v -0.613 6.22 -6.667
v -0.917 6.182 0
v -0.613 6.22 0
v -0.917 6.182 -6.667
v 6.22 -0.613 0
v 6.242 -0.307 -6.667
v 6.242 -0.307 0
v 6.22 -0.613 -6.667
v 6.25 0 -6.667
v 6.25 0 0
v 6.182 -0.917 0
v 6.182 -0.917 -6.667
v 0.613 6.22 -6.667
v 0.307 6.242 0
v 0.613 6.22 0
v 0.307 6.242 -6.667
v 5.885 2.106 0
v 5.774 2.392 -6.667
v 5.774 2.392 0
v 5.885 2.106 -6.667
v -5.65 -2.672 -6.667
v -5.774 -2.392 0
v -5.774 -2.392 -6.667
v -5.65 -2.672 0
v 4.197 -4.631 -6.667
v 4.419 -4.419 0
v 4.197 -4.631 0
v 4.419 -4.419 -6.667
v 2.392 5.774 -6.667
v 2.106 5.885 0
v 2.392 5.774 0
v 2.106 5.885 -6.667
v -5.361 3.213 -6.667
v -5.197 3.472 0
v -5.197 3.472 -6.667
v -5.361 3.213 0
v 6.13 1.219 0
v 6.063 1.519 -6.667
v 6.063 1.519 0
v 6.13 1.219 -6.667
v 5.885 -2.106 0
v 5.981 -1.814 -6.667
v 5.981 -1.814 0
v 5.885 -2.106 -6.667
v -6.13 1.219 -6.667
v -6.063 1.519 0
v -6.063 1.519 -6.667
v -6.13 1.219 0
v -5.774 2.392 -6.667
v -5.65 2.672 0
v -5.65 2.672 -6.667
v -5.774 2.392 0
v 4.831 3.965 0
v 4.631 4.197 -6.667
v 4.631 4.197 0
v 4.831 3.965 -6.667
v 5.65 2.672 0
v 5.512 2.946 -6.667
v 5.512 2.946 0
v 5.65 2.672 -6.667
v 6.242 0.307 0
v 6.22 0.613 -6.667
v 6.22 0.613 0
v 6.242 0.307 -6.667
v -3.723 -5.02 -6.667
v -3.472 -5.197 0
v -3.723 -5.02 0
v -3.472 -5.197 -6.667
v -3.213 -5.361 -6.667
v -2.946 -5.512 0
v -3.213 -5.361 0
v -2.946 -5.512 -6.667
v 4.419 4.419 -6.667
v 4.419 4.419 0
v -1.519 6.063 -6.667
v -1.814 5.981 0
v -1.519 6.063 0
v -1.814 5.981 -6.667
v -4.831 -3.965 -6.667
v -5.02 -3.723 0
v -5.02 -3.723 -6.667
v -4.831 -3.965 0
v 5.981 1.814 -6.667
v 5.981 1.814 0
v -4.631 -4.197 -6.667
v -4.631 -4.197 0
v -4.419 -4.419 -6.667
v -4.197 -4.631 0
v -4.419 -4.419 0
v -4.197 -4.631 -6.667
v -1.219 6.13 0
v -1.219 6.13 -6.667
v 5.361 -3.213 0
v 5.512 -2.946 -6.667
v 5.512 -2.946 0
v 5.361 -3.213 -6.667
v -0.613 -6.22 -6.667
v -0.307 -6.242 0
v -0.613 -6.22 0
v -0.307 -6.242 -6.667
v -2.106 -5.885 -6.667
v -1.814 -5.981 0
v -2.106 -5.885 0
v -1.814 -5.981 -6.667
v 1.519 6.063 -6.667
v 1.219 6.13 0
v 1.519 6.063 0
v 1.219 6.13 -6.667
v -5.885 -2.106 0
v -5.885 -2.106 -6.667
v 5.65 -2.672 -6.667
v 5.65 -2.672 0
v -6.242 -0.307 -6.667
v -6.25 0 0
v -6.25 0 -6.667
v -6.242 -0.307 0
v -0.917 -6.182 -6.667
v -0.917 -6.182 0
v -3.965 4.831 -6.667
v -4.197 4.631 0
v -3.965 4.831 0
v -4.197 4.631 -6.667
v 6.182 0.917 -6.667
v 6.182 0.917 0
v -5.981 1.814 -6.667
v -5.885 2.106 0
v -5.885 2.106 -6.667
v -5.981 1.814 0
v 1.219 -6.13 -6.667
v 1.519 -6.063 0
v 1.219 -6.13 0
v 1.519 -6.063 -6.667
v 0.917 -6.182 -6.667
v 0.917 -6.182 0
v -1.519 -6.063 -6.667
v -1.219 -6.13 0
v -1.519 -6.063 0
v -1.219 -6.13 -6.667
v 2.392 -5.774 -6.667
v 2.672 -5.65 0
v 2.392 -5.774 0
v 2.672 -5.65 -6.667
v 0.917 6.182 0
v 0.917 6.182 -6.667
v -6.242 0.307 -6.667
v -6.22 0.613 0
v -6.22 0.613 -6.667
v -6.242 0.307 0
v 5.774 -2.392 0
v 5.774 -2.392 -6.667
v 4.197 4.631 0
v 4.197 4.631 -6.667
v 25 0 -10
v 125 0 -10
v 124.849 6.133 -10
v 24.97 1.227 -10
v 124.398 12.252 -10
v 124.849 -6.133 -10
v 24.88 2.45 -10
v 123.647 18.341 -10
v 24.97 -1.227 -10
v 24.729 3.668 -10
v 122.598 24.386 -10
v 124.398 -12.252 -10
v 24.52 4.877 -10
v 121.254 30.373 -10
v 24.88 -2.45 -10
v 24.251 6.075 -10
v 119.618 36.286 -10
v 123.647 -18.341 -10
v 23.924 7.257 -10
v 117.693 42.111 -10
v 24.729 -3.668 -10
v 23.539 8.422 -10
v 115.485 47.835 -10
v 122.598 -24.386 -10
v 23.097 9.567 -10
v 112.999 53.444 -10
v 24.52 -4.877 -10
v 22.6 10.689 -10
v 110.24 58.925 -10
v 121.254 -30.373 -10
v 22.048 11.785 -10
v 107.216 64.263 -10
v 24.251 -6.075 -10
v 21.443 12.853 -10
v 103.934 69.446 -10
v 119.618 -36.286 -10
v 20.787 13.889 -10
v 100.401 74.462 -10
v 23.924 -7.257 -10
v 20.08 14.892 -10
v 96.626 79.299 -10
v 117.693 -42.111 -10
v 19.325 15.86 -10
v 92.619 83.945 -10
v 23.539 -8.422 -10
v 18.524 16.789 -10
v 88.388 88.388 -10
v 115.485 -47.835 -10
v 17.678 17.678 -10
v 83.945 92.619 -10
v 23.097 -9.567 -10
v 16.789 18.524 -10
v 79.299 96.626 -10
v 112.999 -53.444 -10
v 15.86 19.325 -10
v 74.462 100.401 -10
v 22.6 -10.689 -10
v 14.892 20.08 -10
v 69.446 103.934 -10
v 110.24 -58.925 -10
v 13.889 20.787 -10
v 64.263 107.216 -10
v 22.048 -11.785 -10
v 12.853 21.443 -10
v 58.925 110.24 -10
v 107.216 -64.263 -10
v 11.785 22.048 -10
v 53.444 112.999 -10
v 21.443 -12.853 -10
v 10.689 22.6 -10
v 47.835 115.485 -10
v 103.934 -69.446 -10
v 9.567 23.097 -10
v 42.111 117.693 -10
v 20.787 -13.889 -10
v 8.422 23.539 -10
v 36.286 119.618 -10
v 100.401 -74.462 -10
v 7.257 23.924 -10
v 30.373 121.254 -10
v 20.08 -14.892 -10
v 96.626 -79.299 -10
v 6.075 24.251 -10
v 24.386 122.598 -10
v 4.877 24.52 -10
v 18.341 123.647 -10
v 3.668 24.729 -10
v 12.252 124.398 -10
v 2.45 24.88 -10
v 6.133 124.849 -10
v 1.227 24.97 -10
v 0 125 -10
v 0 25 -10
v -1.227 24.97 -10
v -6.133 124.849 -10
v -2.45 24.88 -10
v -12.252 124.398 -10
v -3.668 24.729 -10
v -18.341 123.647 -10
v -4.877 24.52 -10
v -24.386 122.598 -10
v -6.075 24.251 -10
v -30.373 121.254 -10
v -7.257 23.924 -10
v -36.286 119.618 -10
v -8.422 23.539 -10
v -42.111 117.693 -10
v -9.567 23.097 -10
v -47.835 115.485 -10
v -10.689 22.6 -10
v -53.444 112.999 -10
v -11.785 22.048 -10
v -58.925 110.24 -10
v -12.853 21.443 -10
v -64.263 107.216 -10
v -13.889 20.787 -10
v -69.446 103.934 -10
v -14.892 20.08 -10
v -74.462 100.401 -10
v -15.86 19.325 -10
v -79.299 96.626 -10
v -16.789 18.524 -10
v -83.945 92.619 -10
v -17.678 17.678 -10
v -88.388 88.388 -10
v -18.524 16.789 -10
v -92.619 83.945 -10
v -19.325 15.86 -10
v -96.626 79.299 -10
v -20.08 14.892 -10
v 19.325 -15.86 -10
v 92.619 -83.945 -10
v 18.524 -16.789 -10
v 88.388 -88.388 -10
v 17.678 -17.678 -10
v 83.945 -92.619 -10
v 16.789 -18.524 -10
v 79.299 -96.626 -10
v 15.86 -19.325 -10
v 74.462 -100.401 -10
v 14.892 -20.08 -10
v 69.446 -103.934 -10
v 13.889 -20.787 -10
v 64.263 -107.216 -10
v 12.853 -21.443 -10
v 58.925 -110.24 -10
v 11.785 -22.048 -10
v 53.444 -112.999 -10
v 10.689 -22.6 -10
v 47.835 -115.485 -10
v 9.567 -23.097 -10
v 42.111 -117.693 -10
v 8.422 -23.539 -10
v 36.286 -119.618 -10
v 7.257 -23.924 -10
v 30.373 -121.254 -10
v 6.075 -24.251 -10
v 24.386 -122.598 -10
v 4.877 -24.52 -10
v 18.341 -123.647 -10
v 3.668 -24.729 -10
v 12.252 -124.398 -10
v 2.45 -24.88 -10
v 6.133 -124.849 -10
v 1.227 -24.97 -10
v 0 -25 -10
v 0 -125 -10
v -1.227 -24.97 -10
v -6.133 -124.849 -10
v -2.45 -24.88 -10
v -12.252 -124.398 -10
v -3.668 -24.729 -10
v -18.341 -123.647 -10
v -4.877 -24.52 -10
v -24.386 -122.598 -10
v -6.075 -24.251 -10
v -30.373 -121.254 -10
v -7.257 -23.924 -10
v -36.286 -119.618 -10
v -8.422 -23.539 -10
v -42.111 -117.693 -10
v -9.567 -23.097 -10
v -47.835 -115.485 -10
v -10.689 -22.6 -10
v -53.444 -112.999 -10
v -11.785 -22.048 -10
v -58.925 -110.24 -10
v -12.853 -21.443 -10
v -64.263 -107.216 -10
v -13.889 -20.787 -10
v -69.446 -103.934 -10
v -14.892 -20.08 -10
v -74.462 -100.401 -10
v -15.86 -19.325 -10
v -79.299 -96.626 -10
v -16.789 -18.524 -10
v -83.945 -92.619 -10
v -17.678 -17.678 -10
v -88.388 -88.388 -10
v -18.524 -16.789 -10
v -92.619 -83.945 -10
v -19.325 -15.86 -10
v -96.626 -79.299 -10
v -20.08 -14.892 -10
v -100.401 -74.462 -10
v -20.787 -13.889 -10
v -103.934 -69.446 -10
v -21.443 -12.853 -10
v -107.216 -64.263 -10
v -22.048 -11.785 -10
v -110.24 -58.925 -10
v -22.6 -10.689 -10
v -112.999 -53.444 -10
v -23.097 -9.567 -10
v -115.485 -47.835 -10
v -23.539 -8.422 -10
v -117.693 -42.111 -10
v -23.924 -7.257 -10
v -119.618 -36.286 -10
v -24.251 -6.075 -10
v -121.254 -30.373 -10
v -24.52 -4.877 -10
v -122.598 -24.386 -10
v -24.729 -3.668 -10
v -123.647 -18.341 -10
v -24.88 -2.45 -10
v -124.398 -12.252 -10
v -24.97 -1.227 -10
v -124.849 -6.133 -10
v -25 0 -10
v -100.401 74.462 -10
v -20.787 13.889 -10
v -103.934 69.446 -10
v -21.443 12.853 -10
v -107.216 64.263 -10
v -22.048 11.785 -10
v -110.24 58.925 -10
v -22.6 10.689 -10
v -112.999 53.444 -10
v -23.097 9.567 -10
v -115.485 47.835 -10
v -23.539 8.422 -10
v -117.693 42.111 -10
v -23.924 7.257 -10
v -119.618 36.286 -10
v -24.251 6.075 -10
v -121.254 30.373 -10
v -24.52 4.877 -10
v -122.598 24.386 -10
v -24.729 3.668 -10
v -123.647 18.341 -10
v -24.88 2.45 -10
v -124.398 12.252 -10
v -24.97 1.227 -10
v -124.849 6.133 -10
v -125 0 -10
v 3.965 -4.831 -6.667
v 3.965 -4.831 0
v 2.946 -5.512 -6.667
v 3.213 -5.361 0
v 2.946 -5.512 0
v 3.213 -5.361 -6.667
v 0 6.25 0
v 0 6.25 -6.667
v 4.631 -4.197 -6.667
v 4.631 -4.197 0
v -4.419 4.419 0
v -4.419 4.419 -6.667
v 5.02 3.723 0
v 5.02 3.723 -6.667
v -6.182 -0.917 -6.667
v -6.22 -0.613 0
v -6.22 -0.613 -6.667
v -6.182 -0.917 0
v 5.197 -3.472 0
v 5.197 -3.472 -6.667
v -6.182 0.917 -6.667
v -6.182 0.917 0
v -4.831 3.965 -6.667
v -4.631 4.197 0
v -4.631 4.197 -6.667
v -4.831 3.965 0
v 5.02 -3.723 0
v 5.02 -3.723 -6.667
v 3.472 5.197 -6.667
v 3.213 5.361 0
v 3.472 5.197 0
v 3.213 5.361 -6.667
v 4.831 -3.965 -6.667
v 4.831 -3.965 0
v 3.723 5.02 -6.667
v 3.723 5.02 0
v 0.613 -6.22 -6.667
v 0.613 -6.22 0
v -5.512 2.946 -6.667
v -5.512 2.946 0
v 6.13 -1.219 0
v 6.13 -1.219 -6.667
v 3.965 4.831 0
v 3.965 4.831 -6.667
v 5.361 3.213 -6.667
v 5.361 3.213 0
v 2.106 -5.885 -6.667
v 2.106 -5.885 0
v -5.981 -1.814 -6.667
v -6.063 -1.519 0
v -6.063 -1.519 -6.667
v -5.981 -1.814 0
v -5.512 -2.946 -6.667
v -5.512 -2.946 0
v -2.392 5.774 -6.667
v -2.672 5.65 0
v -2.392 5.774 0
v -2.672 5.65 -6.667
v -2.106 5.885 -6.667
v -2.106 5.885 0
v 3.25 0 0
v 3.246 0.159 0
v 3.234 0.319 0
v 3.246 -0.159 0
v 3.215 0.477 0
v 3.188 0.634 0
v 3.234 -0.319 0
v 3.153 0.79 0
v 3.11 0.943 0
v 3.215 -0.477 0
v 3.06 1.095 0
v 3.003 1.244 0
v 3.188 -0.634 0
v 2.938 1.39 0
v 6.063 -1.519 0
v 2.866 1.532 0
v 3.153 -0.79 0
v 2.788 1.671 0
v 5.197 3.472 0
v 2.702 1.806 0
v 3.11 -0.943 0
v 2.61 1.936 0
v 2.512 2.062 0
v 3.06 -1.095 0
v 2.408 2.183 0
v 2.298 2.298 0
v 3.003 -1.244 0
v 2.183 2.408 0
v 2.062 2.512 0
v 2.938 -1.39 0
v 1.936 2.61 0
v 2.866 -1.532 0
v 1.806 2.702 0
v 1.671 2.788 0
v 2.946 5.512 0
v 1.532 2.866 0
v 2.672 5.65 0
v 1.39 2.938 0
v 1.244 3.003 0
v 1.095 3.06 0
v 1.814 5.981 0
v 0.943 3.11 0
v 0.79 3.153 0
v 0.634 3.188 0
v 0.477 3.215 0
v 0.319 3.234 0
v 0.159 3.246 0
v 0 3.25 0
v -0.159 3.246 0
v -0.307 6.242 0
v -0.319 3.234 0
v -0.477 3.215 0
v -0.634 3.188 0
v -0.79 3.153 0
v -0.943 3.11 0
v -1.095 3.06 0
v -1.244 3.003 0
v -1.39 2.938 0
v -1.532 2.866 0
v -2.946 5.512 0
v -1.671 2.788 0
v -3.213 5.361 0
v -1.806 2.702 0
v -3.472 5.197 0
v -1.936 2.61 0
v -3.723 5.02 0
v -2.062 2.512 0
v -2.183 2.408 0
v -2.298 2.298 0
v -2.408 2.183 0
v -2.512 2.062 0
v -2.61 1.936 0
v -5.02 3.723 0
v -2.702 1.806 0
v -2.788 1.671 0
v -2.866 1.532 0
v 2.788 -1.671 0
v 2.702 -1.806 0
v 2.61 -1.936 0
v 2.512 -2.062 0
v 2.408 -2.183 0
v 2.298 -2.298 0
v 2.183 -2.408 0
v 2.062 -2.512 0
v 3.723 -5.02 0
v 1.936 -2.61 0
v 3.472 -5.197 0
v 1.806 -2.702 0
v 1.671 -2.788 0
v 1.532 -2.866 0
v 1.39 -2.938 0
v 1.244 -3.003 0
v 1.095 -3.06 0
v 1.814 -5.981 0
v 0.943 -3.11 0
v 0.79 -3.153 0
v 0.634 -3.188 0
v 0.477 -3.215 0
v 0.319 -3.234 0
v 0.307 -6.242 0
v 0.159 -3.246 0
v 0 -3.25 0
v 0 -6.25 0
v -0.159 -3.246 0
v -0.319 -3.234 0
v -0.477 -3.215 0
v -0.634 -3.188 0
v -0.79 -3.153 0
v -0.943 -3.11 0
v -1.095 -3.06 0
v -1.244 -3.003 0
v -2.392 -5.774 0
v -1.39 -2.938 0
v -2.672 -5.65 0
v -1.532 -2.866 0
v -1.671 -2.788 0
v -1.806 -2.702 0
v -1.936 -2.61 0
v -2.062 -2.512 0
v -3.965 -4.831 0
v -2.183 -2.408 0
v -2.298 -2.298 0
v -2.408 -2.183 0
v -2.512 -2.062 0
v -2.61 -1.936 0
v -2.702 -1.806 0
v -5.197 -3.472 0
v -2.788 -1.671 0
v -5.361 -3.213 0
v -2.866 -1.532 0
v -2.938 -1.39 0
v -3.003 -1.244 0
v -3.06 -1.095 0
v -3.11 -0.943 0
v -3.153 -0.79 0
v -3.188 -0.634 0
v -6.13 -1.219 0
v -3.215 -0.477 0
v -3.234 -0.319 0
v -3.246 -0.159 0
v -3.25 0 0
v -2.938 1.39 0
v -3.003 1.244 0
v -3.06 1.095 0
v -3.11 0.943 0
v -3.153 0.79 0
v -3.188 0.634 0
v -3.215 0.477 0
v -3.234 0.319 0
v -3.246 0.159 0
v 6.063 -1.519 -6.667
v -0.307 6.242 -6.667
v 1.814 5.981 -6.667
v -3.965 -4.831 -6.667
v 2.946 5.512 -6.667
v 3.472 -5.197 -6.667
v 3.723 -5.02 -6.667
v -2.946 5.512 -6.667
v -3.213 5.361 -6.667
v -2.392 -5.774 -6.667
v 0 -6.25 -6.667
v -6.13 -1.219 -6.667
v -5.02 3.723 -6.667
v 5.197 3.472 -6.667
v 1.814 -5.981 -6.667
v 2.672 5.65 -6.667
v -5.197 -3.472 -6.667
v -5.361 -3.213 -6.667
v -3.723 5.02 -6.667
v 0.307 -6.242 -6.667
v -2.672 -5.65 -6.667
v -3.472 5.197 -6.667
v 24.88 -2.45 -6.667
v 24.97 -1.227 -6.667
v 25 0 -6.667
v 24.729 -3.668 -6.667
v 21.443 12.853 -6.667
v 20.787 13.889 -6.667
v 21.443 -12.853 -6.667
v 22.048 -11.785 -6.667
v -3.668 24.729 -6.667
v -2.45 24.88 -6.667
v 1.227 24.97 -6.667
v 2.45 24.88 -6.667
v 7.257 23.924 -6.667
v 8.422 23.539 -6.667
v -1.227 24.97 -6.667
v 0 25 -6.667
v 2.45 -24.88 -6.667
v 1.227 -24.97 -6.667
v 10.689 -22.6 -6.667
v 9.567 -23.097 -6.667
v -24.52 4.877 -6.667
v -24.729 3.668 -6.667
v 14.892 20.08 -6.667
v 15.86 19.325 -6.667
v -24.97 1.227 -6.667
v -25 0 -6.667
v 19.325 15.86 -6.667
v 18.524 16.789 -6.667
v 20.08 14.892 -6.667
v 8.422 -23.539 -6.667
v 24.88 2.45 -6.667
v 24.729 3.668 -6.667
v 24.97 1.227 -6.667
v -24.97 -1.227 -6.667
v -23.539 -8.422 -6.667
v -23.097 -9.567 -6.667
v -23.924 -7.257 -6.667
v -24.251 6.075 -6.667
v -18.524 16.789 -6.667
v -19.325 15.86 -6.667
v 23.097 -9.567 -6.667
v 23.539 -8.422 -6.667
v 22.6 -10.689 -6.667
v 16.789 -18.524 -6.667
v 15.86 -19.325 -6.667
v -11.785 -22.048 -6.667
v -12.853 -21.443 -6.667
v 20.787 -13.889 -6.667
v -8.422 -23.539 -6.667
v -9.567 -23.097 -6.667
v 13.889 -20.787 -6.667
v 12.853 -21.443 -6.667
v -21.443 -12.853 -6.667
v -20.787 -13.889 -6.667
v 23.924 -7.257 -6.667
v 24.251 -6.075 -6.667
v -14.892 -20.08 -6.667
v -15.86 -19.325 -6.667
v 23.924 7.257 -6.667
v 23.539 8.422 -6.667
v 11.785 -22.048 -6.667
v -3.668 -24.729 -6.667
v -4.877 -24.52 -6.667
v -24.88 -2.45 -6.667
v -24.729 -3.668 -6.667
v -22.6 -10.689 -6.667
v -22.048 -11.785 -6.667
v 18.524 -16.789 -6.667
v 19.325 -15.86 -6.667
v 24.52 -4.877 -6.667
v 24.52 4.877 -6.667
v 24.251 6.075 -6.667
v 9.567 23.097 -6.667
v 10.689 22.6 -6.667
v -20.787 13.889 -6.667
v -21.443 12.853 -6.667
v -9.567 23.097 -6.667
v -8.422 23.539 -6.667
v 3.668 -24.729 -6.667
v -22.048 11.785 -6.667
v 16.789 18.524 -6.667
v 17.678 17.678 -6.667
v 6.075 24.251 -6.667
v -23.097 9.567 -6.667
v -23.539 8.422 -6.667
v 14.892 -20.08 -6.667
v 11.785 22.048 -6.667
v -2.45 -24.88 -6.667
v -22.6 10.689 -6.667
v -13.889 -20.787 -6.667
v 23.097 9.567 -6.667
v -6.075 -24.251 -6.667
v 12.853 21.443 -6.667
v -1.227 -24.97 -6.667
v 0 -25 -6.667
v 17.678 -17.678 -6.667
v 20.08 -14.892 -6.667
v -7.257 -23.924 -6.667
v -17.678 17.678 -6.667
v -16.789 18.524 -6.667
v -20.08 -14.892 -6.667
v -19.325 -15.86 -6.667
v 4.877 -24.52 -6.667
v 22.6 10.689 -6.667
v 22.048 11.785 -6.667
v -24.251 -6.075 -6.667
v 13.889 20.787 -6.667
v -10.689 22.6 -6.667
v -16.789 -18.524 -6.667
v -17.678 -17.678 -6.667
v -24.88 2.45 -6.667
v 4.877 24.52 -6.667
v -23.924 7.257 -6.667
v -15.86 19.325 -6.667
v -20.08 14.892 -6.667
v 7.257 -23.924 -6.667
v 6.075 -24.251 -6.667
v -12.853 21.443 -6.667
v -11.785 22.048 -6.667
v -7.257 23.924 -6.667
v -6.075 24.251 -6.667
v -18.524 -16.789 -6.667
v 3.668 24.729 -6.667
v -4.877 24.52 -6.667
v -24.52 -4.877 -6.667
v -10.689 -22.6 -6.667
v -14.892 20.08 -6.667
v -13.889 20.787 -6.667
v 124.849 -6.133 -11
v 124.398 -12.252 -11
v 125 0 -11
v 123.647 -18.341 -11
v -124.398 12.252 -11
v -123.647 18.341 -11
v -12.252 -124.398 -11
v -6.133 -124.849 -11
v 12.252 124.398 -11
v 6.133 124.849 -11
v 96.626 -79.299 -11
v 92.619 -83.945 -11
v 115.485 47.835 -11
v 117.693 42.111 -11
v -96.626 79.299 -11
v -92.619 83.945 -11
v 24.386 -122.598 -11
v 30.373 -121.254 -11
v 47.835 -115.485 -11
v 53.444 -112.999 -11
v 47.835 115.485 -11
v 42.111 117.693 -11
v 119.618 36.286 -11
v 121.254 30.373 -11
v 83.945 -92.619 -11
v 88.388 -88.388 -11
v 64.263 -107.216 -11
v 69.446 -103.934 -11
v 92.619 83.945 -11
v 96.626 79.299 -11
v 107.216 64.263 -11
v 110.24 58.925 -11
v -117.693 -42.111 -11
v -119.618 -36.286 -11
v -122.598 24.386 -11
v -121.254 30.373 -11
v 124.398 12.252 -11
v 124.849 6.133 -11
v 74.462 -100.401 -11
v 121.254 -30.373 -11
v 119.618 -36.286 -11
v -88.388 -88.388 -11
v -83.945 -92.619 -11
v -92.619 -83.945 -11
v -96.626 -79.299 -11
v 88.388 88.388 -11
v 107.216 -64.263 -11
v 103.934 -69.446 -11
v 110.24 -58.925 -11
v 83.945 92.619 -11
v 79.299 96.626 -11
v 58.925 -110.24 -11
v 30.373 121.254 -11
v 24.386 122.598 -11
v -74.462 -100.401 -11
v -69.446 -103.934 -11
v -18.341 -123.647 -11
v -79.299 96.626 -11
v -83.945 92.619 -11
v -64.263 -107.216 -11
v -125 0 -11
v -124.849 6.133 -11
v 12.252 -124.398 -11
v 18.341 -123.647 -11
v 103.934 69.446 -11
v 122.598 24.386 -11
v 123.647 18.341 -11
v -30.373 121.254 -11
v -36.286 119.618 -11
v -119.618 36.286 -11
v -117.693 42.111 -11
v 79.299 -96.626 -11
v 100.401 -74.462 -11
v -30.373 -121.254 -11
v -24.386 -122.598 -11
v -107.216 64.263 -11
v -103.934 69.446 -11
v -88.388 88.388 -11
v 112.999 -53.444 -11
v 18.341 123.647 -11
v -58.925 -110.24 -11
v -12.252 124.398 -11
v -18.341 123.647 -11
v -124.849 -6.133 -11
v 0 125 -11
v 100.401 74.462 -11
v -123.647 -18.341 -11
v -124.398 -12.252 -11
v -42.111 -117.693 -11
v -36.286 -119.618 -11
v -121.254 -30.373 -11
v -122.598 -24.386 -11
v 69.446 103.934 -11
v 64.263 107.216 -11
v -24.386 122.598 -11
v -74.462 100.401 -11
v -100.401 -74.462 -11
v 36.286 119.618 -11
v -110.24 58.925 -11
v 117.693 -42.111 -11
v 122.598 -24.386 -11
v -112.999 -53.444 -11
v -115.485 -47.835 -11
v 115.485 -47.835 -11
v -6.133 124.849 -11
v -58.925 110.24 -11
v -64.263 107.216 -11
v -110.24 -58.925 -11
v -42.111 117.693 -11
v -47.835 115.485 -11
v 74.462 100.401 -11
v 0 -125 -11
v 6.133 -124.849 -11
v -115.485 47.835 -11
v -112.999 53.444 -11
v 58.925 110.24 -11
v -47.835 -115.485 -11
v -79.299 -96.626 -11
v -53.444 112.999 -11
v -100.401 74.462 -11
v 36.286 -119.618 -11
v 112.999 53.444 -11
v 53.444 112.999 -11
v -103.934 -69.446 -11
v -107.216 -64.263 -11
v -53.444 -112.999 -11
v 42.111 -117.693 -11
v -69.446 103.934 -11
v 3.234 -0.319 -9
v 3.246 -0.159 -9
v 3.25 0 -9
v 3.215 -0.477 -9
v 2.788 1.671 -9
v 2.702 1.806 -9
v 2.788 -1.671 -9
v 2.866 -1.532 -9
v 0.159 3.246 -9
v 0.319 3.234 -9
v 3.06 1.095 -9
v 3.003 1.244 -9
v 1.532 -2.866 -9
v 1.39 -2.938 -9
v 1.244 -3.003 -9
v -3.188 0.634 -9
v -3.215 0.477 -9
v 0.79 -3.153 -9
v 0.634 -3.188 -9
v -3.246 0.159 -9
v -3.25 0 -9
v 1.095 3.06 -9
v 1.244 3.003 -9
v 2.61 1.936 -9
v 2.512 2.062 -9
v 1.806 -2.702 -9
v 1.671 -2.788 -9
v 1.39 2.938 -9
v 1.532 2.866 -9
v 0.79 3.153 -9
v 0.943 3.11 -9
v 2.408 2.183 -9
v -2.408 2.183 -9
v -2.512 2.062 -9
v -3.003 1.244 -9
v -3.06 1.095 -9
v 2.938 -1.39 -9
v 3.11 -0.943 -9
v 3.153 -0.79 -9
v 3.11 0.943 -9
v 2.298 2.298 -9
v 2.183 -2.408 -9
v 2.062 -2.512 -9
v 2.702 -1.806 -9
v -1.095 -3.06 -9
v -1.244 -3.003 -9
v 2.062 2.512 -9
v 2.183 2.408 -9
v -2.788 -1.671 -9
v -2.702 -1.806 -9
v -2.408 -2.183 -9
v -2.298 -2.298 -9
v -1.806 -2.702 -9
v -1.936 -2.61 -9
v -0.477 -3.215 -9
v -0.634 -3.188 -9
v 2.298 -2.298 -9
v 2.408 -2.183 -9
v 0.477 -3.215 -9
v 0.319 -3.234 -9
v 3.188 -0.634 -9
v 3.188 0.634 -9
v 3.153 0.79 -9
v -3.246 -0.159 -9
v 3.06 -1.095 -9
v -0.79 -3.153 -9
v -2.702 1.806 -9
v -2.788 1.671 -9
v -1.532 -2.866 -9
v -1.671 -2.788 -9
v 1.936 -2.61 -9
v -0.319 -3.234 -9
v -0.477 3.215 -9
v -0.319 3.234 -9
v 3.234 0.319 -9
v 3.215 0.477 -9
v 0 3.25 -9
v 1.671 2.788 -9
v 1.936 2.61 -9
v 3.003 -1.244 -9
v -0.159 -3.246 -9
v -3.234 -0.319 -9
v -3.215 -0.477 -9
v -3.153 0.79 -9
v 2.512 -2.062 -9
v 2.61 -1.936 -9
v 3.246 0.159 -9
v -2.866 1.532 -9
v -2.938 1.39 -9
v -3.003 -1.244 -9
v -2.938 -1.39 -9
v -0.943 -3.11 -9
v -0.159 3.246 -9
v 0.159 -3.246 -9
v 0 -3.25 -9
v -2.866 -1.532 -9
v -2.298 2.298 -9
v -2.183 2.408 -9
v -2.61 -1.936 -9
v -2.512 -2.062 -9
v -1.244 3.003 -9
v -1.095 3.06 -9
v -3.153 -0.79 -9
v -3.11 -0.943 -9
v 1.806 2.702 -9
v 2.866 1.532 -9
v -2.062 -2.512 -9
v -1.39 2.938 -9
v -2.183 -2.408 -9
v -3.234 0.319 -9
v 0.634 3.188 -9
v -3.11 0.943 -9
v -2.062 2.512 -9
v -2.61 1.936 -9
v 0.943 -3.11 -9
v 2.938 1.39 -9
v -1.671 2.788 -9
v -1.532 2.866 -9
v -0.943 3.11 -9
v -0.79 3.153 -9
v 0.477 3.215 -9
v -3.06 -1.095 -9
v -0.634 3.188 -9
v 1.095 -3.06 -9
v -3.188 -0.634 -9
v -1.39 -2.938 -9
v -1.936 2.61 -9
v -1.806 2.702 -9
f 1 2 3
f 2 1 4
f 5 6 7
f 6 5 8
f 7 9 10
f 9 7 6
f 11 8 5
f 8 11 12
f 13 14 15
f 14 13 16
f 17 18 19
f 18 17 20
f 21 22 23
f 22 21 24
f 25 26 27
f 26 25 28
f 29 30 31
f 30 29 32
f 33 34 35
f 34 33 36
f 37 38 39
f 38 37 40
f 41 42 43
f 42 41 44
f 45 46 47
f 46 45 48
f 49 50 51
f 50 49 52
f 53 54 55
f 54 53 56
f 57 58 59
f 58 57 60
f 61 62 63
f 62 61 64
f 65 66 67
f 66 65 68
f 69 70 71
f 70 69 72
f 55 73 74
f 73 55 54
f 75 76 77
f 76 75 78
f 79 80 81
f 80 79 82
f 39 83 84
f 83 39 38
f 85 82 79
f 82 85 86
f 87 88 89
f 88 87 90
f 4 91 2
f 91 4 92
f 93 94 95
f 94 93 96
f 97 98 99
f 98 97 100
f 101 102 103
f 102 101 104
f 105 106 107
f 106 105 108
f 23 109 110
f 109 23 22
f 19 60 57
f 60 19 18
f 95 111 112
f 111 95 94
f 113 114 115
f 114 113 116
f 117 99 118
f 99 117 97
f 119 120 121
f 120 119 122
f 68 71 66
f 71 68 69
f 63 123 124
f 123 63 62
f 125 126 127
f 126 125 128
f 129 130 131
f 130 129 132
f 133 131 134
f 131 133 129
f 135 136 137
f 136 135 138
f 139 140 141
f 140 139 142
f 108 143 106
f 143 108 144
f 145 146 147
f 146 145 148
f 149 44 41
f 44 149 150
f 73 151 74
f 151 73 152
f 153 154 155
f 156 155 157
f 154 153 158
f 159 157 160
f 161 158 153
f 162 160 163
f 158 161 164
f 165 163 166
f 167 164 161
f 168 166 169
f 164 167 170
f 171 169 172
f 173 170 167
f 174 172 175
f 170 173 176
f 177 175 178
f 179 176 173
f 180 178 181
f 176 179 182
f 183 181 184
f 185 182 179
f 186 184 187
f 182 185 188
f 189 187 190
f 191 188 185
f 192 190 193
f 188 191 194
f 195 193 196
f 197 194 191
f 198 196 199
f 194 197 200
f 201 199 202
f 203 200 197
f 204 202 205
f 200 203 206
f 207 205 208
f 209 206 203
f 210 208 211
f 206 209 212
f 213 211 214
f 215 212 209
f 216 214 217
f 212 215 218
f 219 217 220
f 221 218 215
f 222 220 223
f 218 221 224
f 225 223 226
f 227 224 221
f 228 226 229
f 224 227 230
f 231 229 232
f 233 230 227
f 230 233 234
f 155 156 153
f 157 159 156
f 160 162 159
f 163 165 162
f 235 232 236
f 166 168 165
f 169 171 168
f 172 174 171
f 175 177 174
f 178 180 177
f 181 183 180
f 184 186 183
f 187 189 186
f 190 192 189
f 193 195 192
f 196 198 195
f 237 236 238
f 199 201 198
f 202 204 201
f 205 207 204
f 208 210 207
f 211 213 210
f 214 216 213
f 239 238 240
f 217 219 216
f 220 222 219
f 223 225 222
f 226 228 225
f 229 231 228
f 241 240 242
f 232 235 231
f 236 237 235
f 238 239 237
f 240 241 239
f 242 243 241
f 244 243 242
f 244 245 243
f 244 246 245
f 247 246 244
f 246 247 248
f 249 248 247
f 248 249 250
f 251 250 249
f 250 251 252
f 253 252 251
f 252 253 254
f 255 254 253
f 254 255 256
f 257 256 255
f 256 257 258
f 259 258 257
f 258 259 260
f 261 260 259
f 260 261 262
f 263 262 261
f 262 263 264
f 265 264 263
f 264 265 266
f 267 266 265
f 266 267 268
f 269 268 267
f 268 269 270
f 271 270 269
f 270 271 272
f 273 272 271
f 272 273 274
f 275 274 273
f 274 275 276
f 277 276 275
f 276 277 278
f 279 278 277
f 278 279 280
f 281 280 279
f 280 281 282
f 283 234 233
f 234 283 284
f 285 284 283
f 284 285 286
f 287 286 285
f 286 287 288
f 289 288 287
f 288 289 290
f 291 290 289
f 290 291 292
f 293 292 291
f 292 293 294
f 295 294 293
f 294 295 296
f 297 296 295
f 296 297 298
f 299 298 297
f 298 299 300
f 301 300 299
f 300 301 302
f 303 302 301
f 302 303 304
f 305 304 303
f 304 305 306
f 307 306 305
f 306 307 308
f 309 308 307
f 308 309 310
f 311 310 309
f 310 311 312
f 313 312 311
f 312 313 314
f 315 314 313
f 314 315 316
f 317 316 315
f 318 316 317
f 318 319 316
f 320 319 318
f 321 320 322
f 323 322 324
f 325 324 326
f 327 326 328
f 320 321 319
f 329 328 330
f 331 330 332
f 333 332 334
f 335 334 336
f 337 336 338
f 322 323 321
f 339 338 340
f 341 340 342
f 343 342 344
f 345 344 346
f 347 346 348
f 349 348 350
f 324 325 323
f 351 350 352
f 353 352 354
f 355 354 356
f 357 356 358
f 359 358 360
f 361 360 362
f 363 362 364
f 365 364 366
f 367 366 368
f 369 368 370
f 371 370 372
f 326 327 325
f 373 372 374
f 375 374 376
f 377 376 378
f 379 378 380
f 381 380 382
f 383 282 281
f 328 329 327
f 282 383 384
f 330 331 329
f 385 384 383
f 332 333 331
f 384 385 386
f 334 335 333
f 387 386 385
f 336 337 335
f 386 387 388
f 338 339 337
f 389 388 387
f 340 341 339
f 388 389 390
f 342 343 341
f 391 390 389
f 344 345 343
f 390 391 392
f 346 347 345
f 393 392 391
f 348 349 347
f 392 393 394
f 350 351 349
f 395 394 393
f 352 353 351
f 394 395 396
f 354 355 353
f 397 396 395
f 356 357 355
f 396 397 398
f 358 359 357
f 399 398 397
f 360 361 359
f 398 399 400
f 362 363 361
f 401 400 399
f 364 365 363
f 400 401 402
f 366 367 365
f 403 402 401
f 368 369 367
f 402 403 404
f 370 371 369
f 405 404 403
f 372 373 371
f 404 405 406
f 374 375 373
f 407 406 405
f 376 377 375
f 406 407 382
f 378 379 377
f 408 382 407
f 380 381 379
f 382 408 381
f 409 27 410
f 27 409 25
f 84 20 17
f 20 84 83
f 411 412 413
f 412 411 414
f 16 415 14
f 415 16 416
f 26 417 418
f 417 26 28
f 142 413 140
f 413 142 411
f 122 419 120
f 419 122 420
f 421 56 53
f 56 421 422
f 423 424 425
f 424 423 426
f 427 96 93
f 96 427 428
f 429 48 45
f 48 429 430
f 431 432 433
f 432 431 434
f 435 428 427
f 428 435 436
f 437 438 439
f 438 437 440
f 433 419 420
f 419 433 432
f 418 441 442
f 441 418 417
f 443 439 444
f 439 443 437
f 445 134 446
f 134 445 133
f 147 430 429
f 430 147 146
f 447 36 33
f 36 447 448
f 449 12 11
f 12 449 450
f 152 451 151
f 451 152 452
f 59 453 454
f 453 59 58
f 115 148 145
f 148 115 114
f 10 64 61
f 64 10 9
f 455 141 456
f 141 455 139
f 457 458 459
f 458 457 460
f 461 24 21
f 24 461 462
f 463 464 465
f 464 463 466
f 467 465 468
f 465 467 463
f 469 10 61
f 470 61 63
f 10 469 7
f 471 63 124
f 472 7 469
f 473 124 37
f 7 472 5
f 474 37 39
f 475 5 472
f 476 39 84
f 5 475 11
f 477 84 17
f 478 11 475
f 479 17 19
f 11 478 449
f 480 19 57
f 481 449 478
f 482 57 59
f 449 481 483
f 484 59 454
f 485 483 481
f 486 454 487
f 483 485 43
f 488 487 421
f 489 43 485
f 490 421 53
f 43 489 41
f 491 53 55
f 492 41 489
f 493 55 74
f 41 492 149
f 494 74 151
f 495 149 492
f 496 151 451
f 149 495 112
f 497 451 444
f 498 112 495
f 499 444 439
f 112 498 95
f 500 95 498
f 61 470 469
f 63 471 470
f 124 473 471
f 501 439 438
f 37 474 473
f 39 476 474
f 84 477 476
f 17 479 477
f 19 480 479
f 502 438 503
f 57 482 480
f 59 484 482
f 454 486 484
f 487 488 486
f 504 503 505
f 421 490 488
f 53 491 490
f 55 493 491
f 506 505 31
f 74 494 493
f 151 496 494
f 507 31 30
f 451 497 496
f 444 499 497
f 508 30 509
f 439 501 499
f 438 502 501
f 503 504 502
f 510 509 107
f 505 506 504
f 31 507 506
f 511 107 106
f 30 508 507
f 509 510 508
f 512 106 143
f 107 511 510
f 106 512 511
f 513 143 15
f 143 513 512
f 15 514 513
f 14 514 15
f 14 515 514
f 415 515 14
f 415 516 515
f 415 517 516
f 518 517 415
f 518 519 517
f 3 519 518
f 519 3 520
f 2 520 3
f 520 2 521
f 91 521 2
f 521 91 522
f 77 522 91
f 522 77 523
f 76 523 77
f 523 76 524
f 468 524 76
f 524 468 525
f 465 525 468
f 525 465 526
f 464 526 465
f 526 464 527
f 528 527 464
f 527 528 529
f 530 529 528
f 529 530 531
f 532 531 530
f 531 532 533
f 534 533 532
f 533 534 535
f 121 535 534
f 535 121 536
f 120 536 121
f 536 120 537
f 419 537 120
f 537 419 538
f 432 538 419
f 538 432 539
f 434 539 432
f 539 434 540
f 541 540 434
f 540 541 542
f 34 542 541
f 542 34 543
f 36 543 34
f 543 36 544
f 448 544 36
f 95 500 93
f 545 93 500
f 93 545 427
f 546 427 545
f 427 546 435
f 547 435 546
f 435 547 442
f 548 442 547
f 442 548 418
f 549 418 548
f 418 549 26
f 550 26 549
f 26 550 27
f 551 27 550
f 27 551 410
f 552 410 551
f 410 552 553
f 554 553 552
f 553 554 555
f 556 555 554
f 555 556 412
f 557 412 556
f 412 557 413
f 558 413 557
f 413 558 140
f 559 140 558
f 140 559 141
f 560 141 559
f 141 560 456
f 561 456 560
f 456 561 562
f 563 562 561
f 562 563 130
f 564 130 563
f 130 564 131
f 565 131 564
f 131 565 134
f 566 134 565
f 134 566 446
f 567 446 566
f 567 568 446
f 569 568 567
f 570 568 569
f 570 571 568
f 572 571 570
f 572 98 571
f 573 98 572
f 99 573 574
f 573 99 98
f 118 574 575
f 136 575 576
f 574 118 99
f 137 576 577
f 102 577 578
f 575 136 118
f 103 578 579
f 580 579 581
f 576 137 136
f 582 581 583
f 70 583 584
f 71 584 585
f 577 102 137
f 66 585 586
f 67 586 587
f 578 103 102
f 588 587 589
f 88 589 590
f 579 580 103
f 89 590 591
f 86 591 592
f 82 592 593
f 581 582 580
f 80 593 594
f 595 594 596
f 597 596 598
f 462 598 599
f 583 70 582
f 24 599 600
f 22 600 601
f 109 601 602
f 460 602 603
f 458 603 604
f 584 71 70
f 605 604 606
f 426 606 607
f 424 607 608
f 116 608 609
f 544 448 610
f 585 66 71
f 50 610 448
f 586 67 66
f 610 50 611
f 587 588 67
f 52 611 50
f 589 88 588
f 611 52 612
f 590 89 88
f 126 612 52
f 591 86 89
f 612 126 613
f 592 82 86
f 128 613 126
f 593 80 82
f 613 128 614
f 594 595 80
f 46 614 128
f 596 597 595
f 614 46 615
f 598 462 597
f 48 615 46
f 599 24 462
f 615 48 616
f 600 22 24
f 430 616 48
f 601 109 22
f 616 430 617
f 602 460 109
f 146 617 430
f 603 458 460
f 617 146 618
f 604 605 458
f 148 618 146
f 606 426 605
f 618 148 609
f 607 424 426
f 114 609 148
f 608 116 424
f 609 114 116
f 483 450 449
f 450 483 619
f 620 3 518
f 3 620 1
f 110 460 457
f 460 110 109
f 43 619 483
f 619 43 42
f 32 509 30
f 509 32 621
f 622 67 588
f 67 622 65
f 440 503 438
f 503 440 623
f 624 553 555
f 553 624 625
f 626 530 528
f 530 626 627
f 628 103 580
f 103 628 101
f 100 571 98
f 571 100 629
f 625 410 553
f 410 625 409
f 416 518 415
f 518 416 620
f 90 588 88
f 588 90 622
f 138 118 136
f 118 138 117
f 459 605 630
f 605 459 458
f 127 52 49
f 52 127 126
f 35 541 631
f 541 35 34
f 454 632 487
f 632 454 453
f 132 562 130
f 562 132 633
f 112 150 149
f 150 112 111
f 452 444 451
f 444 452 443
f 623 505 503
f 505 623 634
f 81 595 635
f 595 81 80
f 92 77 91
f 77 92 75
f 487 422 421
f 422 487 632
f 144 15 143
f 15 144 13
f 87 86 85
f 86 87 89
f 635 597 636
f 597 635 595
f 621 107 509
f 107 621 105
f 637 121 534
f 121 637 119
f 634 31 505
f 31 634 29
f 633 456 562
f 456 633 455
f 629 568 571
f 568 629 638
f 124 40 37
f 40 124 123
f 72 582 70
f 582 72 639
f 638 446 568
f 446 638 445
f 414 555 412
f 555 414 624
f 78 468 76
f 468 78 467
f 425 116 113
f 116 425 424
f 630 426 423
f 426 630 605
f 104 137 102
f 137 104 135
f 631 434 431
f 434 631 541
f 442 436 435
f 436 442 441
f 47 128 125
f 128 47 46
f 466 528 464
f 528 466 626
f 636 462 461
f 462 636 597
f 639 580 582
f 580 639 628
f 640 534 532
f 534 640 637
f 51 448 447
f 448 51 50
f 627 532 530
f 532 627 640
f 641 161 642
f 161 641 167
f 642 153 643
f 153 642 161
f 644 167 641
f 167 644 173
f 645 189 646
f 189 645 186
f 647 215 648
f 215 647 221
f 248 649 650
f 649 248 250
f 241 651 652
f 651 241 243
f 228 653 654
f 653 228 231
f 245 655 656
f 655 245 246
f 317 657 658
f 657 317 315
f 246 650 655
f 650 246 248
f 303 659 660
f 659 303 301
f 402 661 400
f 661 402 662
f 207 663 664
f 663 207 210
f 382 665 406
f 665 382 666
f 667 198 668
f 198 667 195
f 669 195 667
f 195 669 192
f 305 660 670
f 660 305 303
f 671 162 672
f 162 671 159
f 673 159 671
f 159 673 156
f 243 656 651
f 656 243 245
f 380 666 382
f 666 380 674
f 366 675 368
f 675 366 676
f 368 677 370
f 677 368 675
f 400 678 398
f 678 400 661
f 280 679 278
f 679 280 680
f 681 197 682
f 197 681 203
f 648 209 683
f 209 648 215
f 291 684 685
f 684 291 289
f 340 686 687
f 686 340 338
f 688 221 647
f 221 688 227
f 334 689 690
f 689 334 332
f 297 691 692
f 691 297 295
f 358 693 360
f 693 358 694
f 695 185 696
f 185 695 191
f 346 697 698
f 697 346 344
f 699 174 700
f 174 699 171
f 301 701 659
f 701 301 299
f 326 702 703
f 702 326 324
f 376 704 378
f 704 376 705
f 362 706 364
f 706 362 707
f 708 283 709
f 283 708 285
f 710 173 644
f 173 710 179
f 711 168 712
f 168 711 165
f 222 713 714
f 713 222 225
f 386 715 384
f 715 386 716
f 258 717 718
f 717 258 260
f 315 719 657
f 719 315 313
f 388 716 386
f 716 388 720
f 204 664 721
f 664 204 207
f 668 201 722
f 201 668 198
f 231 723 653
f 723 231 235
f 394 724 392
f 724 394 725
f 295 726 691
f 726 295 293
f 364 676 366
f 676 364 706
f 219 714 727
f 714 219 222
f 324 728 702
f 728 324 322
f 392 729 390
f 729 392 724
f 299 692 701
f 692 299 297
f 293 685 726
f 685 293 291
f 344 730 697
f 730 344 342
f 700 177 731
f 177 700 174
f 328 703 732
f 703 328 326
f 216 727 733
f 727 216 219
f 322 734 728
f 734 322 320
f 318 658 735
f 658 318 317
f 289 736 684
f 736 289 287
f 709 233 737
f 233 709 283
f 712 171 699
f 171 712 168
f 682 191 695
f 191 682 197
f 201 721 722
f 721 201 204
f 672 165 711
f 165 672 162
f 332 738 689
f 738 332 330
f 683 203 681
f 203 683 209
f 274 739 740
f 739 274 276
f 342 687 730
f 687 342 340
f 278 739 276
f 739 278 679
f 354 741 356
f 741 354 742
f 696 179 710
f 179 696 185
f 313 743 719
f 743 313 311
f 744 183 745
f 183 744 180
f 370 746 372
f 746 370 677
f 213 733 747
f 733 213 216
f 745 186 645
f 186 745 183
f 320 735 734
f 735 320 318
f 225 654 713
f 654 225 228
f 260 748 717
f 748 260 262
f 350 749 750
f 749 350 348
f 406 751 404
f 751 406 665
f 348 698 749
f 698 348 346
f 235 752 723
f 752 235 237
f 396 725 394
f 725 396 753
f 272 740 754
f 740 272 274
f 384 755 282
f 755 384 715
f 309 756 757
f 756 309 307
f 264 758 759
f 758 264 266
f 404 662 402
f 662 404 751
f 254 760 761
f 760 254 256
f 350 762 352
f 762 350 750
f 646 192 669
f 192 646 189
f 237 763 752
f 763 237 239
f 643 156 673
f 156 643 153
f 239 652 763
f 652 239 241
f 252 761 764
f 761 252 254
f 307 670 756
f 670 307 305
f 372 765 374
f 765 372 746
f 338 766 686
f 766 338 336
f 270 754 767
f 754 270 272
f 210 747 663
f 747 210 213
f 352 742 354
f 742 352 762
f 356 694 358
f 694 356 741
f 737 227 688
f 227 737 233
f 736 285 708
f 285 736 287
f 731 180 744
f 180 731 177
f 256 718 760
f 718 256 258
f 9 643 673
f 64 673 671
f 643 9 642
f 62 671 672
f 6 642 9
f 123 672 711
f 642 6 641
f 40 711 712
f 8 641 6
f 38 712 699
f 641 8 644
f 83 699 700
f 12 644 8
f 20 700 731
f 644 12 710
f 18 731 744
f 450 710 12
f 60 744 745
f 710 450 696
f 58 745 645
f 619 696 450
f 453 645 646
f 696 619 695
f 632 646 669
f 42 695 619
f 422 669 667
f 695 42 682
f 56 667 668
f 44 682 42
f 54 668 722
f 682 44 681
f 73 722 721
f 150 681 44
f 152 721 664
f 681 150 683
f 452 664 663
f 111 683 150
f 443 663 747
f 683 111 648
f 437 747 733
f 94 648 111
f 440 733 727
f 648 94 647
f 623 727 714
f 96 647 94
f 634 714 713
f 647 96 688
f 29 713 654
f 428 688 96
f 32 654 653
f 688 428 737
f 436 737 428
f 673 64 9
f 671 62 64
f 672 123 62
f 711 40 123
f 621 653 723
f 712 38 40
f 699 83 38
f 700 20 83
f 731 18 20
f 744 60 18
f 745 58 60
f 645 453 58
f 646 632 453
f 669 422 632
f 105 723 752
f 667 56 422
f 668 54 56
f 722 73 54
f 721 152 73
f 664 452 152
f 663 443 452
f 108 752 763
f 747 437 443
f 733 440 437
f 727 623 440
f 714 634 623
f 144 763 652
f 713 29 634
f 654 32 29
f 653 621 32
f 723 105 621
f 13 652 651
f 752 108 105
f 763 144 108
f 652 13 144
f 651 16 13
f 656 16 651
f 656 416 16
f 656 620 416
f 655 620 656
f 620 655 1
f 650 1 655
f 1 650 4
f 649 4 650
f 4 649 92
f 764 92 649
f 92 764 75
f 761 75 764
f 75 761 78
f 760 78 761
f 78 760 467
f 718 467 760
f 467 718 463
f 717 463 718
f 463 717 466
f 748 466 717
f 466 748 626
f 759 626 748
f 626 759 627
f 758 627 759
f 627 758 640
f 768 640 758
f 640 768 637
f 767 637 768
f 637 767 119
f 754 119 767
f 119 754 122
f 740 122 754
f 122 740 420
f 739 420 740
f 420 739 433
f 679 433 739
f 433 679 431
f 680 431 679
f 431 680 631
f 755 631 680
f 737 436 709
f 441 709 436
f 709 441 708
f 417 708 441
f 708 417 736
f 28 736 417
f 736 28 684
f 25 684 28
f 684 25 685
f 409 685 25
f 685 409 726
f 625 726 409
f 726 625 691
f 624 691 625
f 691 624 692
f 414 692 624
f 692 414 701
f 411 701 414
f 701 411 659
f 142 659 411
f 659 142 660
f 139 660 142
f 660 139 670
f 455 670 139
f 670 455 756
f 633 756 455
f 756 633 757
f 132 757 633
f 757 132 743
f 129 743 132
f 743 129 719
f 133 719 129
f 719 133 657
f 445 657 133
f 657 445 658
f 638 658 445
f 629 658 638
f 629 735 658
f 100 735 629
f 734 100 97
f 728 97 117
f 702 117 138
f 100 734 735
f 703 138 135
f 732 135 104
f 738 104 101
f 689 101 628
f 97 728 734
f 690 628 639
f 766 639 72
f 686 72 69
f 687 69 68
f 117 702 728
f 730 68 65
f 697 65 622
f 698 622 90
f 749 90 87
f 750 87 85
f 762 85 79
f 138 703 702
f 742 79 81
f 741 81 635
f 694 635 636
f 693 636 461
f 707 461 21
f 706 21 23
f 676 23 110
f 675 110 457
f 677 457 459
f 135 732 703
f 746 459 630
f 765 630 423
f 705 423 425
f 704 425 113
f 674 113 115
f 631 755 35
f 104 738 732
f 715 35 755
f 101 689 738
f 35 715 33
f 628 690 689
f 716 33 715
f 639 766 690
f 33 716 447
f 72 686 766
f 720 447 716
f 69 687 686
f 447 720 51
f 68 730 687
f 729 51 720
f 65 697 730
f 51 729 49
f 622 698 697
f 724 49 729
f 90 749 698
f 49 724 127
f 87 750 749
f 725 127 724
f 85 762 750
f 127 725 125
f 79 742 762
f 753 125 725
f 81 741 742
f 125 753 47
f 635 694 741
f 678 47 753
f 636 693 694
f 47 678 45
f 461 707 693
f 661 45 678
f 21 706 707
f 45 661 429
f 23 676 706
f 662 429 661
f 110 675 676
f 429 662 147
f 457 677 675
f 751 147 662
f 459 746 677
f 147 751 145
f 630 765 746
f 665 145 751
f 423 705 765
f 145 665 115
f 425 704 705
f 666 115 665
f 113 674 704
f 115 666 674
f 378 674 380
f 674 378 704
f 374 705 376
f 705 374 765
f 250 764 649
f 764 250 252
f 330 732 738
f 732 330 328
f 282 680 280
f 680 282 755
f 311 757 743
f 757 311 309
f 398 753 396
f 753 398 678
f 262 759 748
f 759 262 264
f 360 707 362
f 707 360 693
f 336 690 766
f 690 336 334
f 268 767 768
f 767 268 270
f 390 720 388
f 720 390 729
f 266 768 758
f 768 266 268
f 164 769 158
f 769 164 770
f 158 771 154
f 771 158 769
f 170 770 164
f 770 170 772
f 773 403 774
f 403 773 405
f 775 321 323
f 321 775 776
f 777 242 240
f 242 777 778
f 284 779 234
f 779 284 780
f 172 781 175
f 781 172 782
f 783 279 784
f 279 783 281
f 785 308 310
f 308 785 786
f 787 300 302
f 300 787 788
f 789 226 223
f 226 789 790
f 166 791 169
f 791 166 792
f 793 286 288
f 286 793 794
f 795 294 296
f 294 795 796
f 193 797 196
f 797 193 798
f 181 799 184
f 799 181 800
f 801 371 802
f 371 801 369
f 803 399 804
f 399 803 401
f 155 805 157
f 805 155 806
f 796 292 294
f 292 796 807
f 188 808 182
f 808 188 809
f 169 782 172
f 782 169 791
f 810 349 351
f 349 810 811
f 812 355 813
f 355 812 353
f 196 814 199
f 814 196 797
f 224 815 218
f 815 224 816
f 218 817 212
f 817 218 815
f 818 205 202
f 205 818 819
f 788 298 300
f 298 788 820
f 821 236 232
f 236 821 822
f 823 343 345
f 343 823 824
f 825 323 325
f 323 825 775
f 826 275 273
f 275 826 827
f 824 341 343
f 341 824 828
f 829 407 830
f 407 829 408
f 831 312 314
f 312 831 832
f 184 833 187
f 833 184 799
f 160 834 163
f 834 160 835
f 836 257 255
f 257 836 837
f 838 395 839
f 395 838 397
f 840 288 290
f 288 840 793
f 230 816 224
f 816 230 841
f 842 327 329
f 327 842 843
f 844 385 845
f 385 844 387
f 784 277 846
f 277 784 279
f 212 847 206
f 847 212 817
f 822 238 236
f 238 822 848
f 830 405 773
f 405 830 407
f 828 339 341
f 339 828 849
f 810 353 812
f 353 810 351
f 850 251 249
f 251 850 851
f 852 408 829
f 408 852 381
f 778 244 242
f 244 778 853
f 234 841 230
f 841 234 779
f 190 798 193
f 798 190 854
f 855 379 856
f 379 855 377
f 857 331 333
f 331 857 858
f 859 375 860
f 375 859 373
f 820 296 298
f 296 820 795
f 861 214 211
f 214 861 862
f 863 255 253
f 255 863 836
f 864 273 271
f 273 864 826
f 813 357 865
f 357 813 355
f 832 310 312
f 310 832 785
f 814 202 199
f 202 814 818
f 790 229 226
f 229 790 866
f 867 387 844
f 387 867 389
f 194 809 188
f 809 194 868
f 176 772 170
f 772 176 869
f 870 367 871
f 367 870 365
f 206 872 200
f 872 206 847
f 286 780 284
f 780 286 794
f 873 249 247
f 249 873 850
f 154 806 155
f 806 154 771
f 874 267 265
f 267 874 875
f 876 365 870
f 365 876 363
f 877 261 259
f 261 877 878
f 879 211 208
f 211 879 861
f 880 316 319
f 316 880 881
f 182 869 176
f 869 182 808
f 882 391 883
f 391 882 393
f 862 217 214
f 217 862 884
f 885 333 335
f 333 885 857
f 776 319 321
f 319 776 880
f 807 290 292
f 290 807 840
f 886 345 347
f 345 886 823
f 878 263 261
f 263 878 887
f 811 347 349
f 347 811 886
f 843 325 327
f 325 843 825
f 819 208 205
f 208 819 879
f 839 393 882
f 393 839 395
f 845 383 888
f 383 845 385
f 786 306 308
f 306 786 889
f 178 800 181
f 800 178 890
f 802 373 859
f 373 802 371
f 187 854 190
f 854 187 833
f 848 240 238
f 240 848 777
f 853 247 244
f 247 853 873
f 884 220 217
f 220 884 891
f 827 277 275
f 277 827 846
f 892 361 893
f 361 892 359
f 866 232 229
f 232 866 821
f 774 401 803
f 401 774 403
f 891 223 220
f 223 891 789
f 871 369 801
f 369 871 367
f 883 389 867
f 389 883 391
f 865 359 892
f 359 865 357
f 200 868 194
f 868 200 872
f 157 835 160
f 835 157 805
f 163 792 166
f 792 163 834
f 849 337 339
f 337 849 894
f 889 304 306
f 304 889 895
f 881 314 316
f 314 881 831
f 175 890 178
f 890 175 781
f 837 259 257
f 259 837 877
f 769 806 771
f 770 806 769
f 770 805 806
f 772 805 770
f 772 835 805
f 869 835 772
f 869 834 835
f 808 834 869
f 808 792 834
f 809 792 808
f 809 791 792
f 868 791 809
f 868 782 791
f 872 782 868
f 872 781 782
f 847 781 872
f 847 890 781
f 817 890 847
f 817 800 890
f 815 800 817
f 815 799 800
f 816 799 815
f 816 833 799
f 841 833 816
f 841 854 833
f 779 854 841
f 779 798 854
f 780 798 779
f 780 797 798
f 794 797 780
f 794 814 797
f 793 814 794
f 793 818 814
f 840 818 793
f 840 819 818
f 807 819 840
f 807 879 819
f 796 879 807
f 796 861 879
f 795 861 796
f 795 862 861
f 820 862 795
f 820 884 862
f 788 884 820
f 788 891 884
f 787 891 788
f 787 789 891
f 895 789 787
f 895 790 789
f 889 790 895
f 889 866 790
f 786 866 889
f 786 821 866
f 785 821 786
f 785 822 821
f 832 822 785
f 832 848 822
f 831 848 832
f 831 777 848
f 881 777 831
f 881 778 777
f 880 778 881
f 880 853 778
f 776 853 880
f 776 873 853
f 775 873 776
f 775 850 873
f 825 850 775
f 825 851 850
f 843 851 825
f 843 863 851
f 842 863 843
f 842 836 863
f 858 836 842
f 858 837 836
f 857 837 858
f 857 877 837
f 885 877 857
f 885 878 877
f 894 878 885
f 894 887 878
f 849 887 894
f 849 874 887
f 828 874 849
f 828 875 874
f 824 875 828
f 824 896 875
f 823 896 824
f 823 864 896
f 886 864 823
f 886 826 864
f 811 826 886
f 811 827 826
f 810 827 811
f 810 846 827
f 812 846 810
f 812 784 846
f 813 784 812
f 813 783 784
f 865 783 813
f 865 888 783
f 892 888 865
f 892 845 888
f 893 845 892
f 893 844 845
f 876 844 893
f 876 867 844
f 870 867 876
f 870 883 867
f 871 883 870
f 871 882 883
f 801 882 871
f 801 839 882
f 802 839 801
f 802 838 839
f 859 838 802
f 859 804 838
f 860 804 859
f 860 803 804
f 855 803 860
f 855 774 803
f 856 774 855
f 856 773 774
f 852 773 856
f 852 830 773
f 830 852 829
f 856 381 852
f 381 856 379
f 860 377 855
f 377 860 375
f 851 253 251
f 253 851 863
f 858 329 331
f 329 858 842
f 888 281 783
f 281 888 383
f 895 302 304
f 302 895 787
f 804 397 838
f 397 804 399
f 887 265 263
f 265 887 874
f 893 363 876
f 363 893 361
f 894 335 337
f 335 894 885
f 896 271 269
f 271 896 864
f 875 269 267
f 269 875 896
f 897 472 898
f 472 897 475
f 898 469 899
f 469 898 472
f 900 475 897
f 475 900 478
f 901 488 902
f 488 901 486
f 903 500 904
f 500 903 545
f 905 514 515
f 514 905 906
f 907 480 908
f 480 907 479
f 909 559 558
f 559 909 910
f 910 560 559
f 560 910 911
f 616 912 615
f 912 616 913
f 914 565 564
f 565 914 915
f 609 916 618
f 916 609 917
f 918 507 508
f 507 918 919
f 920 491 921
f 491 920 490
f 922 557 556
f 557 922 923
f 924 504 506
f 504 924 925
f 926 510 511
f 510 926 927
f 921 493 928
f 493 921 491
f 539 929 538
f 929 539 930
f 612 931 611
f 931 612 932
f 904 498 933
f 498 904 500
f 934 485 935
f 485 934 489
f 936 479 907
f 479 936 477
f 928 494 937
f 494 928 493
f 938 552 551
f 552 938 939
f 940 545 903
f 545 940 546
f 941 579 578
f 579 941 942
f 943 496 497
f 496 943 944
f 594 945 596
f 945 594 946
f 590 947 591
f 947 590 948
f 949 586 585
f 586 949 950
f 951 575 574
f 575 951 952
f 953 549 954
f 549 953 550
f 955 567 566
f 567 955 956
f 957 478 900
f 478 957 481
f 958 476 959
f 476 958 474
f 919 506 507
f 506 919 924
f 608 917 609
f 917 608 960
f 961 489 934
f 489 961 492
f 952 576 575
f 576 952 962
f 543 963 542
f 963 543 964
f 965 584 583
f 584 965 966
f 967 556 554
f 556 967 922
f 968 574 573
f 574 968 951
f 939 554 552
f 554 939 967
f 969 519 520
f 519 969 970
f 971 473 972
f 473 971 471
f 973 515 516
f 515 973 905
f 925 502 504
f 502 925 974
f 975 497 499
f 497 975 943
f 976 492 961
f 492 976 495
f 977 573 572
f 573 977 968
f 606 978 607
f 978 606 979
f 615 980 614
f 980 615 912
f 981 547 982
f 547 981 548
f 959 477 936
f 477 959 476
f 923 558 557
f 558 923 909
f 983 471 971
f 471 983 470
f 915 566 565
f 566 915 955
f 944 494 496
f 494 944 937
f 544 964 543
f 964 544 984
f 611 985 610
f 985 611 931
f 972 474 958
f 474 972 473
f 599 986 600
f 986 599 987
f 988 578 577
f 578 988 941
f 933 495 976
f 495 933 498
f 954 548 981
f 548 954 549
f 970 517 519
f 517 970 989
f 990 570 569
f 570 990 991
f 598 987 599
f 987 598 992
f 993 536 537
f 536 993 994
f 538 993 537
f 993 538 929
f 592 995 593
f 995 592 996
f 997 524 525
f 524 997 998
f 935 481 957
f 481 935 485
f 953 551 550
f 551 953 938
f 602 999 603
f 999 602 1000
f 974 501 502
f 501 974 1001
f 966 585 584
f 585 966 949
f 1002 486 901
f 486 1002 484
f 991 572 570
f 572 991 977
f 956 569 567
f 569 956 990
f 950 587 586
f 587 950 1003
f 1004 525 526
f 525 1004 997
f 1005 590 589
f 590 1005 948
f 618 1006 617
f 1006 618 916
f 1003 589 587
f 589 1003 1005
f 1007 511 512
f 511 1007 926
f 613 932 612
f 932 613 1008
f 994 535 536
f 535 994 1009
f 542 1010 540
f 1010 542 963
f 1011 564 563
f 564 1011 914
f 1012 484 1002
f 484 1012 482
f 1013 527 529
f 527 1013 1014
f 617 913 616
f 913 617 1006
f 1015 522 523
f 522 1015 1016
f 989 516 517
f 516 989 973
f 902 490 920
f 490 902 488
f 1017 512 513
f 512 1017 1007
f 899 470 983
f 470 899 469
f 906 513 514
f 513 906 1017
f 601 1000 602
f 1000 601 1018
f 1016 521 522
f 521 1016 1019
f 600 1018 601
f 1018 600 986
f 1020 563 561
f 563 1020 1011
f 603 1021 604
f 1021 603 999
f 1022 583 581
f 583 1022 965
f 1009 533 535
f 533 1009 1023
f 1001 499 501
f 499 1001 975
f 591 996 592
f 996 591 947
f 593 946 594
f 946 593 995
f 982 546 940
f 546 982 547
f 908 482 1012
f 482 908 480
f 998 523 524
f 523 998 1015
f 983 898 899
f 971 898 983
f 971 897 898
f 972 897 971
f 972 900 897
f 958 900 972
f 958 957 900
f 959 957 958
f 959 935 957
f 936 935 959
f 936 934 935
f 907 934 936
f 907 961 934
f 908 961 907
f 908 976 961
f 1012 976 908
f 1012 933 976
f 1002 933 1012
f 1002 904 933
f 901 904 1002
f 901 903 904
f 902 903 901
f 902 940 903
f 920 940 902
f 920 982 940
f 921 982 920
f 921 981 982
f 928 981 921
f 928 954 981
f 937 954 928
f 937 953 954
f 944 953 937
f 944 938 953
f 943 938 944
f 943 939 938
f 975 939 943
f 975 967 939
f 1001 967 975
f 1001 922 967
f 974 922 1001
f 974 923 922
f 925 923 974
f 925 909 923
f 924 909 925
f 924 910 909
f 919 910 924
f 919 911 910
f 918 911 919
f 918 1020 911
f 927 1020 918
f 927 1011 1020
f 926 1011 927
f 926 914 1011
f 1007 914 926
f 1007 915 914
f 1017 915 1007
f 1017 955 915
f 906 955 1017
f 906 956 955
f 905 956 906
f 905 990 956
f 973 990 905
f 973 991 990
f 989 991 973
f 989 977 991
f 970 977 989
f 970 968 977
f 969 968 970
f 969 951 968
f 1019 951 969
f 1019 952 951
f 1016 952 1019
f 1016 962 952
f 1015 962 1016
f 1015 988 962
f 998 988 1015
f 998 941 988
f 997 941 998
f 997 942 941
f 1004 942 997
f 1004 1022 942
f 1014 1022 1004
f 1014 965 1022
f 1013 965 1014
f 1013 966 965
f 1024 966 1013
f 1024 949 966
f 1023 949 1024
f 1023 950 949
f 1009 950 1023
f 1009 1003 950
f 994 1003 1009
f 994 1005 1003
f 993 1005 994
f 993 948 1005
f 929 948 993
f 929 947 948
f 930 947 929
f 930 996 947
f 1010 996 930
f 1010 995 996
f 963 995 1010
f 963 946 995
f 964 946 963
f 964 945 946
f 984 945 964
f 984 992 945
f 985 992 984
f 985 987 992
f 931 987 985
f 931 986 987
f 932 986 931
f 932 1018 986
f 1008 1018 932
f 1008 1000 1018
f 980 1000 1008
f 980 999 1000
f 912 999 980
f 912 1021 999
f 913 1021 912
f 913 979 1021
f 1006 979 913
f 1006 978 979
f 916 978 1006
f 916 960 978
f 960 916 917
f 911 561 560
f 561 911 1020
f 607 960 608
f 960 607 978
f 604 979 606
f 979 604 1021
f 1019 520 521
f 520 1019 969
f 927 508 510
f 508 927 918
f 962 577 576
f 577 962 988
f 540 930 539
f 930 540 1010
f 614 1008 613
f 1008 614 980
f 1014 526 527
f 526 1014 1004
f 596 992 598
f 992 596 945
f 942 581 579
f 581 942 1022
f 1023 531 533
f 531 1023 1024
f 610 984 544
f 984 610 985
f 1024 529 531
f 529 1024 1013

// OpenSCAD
module render() {
  fn = 128;
  thickness = 1.0; // 1.75;
  expansion_fudge = 0.5;
  shaft_radius = (6 + expansion_fudge) / 2.0;
  coupler_thickness = 3;
  coupler_radius = shaft_radius + coupler_thickness;
  coupler_length = 10;
  stabilizer_length = coupler_length / 3;
  stabilizer_radius = 25;
  
  plate_radius = 250.0 / 2.0;

  rotate(a=180, v=[1,0,0])
  difference() {
    union() {
      cylinder(h = coupler_length,
               r1 = coupler_radius,
               r2 = coupler_radius, $fn=fn);
      translate([0, 0, coupler_length-stabilizer_length]) {
        cylinder(h = stabilizer_length,
                 r1 = stabilizer_radius,
                 r2 = stabilizer_radius, $fn=fn);
      }
      translate([0, 0, coupler_length]) {
        cylinder(h = thickness,
                 r1 = plate_radius,
                 r2 = plate_radius, $fn=fn);
      }
    }
    cylinder(h = coupler_length - thickness,
             r1 = shaft_radius,
             r2 = shaft_radius, $fn=fn);
  }
}

// Render main
echo(version=version());
render();
